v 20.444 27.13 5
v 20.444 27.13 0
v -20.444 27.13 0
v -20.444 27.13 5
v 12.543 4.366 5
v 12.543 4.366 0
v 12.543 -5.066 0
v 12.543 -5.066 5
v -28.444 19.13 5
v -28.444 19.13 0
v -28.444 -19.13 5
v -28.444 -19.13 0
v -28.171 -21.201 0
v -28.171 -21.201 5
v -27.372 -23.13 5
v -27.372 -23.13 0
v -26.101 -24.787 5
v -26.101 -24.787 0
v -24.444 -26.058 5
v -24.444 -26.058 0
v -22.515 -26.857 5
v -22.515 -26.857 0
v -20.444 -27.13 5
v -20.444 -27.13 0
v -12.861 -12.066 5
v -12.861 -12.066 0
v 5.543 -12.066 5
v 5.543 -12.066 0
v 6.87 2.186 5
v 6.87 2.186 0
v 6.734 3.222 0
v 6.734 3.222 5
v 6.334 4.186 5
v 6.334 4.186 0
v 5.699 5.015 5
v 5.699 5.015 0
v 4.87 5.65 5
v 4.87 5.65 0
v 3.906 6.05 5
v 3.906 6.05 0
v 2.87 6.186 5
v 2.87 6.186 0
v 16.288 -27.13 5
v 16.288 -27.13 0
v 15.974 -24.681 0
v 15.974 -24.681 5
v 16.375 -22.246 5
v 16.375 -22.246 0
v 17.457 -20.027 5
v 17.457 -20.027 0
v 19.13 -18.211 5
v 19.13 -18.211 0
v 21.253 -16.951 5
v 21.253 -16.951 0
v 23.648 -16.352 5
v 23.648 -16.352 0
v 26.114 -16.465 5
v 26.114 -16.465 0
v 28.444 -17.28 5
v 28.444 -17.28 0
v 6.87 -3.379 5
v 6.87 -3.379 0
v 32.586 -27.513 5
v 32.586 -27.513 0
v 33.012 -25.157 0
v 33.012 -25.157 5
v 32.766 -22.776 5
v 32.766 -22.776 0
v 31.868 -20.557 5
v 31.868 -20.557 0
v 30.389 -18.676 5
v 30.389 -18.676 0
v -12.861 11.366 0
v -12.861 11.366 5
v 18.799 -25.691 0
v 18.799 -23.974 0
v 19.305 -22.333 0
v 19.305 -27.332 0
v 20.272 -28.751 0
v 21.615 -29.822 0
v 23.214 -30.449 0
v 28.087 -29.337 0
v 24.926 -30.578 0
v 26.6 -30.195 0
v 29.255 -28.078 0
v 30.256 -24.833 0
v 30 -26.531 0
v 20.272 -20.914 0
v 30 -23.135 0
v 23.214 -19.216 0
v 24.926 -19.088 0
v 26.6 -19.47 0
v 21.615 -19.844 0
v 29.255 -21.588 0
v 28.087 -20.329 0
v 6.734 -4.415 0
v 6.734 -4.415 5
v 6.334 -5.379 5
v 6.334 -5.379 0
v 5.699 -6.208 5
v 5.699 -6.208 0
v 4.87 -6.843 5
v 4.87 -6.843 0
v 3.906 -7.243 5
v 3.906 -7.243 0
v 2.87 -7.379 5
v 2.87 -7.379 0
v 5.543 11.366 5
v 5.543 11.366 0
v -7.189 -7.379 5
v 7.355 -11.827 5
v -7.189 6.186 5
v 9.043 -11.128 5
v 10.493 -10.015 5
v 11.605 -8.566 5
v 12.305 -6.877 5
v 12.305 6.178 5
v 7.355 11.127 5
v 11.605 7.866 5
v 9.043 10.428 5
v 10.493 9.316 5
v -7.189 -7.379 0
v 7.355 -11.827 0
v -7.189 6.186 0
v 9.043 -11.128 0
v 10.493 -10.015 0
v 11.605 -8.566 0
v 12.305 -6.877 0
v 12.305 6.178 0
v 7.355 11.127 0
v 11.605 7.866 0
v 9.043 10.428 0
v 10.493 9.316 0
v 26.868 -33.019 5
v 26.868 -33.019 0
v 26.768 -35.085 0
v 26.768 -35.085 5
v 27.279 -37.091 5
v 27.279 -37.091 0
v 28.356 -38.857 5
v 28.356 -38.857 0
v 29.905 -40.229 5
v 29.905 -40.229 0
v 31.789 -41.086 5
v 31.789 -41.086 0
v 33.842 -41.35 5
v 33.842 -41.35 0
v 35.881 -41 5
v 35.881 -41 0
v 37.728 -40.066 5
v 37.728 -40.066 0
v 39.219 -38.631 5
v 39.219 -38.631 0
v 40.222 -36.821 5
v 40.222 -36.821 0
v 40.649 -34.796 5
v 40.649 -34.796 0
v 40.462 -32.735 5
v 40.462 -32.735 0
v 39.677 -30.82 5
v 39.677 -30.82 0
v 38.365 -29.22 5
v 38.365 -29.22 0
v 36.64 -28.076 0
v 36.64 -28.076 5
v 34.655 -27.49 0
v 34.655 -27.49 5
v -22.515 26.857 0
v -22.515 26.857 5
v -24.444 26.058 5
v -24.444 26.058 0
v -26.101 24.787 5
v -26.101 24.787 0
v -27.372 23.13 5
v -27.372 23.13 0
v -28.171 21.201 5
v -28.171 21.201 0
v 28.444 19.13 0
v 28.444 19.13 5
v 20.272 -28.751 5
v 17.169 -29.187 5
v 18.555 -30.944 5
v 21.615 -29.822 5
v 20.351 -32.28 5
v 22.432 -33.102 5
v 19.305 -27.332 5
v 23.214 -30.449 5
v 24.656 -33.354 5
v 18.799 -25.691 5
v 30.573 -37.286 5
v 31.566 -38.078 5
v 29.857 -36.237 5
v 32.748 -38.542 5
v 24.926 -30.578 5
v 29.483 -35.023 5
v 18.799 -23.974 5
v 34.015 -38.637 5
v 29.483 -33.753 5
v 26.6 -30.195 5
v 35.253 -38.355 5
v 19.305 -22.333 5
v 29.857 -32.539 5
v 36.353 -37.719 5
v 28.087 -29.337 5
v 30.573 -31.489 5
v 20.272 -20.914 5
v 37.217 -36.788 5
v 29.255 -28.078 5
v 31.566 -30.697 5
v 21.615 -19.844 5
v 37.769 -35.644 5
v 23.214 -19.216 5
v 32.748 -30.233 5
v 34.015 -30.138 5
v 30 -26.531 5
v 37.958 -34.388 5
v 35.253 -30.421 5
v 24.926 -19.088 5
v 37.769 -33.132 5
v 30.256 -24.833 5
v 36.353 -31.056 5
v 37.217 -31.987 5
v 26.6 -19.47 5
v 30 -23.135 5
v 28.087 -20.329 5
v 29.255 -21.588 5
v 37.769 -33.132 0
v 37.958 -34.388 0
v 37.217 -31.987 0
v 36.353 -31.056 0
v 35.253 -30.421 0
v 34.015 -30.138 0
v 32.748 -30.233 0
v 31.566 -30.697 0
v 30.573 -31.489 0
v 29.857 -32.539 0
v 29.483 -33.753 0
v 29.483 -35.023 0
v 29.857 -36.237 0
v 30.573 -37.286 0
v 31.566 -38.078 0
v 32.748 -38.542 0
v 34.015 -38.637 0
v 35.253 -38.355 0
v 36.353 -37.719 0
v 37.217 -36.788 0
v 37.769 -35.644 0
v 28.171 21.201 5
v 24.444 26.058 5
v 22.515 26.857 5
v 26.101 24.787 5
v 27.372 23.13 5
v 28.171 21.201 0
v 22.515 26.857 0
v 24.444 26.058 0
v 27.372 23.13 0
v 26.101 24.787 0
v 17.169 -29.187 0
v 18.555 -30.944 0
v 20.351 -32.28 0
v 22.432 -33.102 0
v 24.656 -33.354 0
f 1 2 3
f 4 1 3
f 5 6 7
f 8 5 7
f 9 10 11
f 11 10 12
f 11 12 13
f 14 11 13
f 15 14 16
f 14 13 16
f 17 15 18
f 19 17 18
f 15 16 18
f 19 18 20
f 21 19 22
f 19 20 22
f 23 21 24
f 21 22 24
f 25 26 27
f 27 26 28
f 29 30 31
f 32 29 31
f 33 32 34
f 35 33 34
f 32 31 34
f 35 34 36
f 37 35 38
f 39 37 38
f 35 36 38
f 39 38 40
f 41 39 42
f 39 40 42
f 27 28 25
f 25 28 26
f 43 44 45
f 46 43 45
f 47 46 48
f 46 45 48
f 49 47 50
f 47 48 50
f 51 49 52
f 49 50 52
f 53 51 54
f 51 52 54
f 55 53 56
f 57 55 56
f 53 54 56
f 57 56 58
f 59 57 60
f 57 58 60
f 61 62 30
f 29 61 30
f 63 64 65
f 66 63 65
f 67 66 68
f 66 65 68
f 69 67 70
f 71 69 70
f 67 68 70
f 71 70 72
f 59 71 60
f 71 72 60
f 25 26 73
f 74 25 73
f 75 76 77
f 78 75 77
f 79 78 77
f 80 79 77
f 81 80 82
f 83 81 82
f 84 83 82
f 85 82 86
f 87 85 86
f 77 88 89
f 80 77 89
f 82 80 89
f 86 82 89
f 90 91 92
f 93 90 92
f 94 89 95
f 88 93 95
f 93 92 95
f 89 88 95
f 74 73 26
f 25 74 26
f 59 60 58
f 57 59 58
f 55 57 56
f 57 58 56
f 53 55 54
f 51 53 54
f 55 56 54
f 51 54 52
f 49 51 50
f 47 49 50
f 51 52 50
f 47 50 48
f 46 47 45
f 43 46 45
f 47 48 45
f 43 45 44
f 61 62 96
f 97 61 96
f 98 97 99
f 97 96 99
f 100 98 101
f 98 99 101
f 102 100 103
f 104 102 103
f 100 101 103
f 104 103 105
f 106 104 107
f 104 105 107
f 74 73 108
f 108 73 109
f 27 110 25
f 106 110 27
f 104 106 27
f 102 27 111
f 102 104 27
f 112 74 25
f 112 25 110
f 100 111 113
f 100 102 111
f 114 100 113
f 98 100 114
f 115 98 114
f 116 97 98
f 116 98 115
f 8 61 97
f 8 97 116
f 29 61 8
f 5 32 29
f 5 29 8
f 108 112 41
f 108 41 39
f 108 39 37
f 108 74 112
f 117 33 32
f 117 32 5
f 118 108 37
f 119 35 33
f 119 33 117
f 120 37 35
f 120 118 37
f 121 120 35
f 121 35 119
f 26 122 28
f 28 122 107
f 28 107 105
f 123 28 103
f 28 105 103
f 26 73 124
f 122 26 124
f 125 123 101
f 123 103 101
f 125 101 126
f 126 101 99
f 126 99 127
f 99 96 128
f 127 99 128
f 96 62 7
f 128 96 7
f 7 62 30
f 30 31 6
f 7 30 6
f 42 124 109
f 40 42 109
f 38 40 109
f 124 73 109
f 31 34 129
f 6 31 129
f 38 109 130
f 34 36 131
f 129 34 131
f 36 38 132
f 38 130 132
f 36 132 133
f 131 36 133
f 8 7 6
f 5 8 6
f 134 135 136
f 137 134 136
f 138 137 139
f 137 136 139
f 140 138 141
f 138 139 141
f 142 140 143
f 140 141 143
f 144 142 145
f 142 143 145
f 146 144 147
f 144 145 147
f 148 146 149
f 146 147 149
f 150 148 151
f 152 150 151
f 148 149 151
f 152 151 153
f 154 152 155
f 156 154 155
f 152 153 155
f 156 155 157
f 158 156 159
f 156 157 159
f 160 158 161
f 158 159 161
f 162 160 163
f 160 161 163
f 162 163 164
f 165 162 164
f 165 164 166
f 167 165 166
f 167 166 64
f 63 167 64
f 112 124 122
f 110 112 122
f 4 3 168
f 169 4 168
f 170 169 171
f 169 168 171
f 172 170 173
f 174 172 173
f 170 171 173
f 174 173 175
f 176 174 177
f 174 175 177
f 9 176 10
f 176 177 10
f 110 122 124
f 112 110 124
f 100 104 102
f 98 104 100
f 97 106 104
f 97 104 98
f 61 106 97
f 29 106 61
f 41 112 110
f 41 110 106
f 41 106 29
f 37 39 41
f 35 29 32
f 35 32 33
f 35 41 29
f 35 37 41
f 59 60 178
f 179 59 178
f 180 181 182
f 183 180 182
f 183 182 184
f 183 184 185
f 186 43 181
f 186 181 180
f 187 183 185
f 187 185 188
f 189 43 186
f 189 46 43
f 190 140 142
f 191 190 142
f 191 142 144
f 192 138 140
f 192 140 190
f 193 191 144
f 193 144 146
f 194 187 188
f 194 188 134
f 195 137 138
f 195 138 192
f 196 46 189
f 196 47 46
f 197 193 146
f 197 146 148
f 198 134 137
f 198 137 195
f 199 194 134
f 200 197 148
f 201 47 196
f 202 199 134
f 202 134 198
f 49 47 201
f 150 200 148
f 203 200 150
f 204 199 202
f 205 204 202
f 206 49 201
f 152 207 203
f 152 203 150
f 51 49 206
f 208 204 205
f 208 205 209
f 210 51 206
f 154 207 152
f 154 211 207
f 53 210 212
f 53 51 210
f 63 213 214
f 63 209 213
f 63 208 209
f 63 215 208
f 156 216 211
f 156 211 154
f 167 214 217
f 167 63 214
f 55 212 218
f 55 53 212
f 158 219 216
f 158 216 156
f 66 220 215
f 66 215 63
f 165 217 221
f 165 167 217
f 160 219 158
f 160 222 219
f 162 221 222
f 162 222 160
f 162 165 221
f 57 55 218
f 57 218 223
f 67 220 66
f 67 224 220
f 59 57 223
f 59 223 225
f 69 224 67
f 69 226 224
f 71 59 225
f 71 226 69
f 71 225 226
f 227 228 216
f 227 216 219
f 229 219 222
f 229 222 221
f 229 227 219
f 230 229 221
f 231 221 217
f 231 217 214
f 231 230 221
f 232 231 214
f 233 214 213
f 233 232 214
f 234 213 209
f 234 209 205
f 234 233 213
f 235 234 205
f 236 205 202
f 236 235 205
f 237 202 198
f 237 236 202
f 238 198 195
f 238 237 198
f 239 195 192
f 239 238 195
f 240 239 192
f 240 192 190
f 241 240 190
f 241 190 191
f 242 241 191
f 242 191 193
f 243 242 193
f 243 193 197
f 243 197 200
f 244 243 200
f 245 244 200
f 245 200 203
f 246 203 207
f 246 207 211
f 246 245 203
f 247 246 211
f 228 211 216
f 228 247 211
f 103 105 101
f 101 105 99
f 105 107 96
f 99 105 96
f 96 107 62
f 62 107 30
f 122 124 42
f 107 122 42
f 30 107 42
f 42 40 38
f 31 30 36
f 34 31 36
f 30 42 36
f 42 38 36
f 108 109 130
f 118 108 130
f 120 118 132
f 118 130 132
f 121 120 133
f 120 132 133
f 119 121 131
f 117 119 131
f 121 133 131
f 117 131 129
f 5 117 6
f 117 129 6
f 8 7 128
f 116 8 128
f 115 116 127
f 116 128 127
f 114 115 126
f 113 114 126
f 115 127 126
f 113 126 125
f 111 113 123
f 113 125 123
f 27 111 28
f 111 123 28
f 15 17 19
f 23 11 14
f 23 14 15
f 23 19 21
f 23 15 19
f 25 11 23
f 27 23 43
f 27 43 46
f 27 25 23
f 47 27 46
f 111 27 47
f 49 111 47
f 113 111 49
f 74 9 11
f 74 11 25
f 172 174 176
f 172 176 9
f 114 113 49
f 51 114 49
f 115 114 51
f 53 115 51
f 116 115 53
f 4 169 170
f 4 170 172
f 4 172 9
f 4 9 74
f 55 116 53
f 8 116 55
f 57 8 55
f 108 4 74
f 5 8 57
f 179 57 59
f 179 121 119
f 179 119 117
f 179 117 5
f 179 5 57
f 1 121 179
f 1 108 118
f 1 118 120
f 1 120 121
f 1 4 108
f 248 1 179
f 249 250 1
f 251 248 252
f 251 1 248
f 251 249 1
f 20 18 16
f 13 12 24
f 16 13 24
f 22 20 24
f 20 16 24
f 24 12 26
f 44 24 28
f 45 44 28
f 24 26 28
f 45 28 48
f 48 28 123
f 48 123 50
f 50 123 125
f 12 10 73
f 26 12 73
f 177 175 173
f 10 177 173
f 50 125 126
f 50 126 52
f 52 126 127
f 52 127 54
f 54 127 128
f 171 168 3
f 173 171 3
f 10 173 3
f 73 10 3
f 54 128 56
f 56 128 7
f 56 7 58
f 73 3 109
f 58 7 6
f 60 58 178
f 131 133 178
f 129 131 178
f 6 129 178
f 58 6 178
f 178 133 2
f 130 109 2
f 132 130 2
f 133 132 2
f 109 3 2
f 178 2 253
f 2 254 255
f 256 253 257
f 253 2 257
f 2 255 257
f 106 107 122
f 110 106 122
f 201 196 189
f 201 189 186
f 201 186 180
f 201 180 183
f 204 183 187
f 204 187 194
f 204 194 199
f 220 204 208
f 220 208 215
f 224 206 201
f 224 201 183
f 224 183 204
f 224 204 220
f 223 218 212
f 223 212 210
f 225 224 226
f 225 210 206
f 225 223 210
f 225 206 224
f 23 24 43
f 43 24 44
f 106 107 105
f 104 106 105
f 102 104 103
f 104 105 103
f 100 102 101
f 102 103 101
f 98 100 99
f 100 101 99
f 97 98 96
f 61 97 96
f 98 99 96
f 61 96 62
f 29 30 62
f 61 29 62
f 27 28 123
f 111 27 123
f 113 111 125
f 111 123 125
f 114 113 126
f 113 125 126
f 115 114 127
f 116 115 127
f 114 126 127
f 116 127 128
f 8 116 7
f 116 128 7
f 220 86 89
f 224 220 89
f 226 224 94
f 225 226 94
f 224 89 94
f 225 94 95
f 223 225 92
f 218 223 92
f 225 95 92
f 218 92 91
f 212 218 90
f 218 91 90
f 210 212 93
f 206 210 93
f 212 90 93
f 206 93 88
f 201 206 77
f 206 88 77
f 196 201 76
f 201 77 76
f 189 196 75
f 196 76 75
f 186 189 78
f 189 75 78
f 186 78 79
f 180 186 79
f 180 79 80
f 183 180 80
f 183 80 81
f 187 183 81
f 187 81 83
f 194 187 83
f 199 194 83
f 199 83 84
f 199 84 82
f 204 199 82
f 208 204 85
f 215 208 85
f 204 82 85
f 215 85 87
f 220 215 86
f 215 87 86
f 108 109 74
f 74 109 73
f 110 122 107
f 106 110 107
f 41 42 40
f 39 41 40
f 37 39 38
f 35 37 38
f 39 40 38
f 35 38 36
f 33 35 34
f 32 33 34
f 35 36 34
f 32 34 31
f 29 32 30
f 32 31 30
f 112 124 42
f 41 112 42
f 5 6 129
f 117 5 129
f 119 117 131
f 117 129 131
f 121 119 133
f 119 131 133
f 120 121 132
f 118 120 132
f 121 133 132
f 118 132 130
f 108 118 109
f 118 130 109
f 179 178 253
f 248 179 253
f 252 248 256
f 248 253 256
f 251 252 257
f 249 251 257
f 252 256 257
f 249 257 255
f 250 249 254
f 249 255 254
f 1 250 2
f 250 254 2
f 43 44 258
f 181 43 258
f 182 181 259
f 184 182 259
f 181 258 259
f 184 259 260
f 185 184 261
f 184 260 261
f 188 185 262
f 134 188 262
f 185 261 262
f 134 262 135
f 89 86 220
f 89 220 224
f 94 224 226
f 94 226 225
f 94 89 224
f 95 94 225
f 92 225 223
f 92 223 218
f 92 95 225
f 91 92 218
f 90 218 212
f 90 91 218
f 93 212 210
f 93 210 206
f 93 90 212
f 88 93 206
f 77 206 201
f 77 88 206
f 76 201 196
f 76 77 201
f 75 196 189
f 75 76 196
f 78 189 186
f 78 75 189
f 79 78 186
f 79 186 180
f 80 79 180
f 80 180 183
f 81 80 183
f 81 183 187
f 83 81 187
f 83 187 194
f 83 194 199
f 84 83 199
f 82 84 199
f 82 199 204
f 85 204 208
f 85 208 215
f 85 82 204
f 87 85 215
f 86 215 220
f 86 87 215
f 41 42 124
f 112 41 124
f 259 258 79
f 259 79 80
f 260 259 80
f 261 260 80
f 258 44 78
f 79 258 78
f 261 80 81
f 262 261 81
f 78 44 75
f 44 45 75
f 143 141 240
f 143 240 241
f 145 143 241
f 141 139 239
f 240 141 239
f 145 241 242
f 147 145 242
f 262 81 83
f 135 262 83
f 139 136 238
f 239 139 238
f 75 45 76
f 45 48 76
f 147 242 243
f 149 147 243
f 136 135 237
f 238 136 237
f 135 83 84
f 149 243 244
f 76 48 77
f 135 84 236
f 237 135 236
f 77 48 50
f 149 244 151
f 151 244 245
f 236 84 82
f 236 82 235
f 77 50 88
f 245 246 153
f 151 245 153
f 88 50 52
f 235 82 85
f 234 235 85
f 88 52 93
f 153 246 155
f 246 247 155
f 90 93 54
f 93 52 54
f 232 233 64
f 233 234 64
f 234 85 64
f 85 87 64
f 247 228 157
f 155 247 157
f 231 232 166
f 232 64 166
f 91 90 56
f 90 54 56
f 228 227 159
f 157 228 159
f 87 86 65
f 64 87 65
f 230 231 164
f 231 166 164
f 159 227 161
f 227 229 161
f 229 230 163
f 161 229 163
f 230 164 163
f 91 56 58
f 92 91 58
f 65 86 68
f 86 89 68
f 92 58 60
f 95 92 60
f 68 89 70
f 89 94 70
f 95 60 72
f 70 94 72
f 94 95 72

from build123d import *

# Parameters (mm, degrees)
F1_DEPTH = 5
F0_R     = 5.760850323
F0_R_2   = 4.2613533731
F2_DEPTH = 5


with BuildPart() as f1:
    # F0 (on Top) → F1 (new body)
    with BuildSketch(Plane.XY):
        with BuildLine():
            Line((20.4439530224, 27.1300673485), (-20.4439530224, 27.1300673485))
            ThreePointArc((-20.4439530224, 27.1300673485), (-26.1008072719, 24.786921598), (-28.4439530224, 19.1300673485))
            Line((-28.4439530224, 19.1300673485), (-28.4439530224, -19.1300673485))
            ThreePointArc((-28.4439530224, -19.1300673485), (-26.1008072719, -24.786921598), (-20.4439530224, -27.1300673485))
            Line((-20.4439530224, -27.1300673485), (16.2882330233, -27.1300673485))
            ThreePointArc((16.2882330233, -27.1300673485), (19.1298049483, -18.2112054104), (28.4439530224, -17.2799294426))
            Line((28.4439530224, -17.2799294426), (28.4439530224, 19.1300673485))
            ThreePointArc((28.4439530224, 19.1300673485), (26.1008072719, 24.786921598), (20.4439530224, 27.1300673485))
        make_face()
        with BuildLine():
            Line((-12.8614585847, -12.0656630024), (-12.8614585847, 11.3658718765))
            Line((-12.8614585847, 11.3658718765), (5.5432582572, 11.3658718765))
            ThreePointArc((5.5432582572, 11.3658718765), (10.4930057255, 9.3156193448), (12.5432582572, 4.3658718765))
            Line((12.5432582572, 4.3658718765), (12.5432582572, -5.0656630024))
            ThreePointArc((12.5432582572, -5.0656630024), (10.4930057255, -10.0154104707), (5.5432582572, -12.0656630024))
            Line((5.5432582572, -12.0656630024), (-12.8614585847, -12.0656630024))
        make_face(mode=Mode.SUBTRACT)
    extrude(amount=F1_DEPTH)


with BuildPart() as f1b:
    # F0 (on Top) → F1, piece 2 (new body)
    with BuildSketch(Plane.XY):
        with BuildLine():
            Line((2.8703605793, 6.1862696894), (-7.1885595098, 6.1862696894))
            Line((-7.1885595098, 6.1862696894), (-7.1885595098, -7.379356306))
            Line((-7.1885595098, -7.379356306), (2.8703605793, -7.379356306))
            ThreePointArc((2.8703605793, -7.379356306), (5.6987877041, -6.2077834308), (6.8703605793, -3.379356306))
            Line((6.8703605793, -3.379356306), (6.8703605793, 2.1862696894))
            ThreePointArc((6.8703605793, 2.1862696894), (5.6987877041, 5.0146968141), (2.8703605793, 6.1862696894))
        make_face()
    extrude(amount=F1_DEPTH)


with BuildPart() as f1c:
    # F0 (on Top) → F1, piece 3 (new body)
    with BuildSketch(Plane.XY):
        with Locations((24.4954992086, -24.8328261077)):
            Circle(F0_R)
    extrude(amount=F1_DEPTH)


with BuildPart() as f1d:
    # F0 (on Top) → F1, piece 4 (new body)
    with BuildSketch(Plane.XY):
        with Locations((33.6965397, -34.3877524137)):
            Circle(F0_R_2)
    extrude(amount=F1_DEPTH)


with BuildPart() as f2:
    # F0 (on Top) → F2 (new body)
    with BuildSketch(Plane.XY):
        with BuildLine():
            Line((5.5432582572, 11.3658718765), (-12.8614585847, 11.3658718765))
            Line((-12.8614585847, 11.3658718765), (-12.8614585847, -12.0656630024))
            Line((-12.8614585847, -12.0656630024), (5.5432582572, -12.0656630024))
            ThreePointArc((5.5432582572, -12.0656630024), (10.4930057255, -10.0154104707), (12.5432582572, -5.0656630024))
            Line((12.5432582572, -5.0656630024), (12.5432582572, 4.3658718765))
            ThreePointArc((12.5432582572, 4.3658718765), (10.4930057255, 9.3156193448), (5.5432582572, 11.3658718765))
        make_face()
        with BuildLine():
            Line((-7.1885595098, -7.379356306), (-7.1885595098, 6.1862696894))
            Line((-7.1885595098, 6.1862696894), (2.8703605793, 6.1862696894))
            ThreePointArc((2.8703605793, 6.1862696894), (5.6987877041, 5.0146968141), (6.8703605793, 2.1862696894))
            Line((6.8703605793, 2.1862696894), (6.8703605793, -3.379356306))
            ThreePointArc((6.8703605793, -3.379356306), (5.6987877041, -6.2077834308), (2.8703605793, -7.379356306))
            Line((2.8703605793, -7.379356306), (-7.1885595098, -7.379356306))
        make_face(mode=Mode.SUBTRACT)
    extrude(amount=F2_DEPTH)


with BuildPart() as f2b:
    # F0 (on Top) → F2, piece 2 (new body)
    with BuildSketch(Plane.XY):
        with BuildLine():
            ThreePointArc((32.5858523238, -27.5128861863), (32.3955985116, -21.6351759462), (28.4439530224, -17.2799294426))
            ThreePointArc((28.4439530224, -17.2799294426), (19.1298049483, -18.2112054104), (16.2882330233, -27.1300673485))
            ThreePointArc((16.2882330233, -27.1300673485), (20.3508359578, -32.2798592144), (26.8684643801, -33.0185192274))
            ThreePointArc((26.8684643801, -33.0185192274), (38.5270662844, -39.4040682941), (32.5858523238, -27.5128861863))
        make_face()
        with Locations((33.6965397, -34.3877524137)):
            Circle(F0_R_2, mode=Mode.SUBTRACT)
        with Locations((24.4954992086, -24.8328261077)):
            Circle(F0_R, mode=Mode.SUBTRACT)
    extrude(amount=F2_DEPTH)


solid = Compound([f1.part, f1b.part, f1c.part, f2.part, f2b.part])
